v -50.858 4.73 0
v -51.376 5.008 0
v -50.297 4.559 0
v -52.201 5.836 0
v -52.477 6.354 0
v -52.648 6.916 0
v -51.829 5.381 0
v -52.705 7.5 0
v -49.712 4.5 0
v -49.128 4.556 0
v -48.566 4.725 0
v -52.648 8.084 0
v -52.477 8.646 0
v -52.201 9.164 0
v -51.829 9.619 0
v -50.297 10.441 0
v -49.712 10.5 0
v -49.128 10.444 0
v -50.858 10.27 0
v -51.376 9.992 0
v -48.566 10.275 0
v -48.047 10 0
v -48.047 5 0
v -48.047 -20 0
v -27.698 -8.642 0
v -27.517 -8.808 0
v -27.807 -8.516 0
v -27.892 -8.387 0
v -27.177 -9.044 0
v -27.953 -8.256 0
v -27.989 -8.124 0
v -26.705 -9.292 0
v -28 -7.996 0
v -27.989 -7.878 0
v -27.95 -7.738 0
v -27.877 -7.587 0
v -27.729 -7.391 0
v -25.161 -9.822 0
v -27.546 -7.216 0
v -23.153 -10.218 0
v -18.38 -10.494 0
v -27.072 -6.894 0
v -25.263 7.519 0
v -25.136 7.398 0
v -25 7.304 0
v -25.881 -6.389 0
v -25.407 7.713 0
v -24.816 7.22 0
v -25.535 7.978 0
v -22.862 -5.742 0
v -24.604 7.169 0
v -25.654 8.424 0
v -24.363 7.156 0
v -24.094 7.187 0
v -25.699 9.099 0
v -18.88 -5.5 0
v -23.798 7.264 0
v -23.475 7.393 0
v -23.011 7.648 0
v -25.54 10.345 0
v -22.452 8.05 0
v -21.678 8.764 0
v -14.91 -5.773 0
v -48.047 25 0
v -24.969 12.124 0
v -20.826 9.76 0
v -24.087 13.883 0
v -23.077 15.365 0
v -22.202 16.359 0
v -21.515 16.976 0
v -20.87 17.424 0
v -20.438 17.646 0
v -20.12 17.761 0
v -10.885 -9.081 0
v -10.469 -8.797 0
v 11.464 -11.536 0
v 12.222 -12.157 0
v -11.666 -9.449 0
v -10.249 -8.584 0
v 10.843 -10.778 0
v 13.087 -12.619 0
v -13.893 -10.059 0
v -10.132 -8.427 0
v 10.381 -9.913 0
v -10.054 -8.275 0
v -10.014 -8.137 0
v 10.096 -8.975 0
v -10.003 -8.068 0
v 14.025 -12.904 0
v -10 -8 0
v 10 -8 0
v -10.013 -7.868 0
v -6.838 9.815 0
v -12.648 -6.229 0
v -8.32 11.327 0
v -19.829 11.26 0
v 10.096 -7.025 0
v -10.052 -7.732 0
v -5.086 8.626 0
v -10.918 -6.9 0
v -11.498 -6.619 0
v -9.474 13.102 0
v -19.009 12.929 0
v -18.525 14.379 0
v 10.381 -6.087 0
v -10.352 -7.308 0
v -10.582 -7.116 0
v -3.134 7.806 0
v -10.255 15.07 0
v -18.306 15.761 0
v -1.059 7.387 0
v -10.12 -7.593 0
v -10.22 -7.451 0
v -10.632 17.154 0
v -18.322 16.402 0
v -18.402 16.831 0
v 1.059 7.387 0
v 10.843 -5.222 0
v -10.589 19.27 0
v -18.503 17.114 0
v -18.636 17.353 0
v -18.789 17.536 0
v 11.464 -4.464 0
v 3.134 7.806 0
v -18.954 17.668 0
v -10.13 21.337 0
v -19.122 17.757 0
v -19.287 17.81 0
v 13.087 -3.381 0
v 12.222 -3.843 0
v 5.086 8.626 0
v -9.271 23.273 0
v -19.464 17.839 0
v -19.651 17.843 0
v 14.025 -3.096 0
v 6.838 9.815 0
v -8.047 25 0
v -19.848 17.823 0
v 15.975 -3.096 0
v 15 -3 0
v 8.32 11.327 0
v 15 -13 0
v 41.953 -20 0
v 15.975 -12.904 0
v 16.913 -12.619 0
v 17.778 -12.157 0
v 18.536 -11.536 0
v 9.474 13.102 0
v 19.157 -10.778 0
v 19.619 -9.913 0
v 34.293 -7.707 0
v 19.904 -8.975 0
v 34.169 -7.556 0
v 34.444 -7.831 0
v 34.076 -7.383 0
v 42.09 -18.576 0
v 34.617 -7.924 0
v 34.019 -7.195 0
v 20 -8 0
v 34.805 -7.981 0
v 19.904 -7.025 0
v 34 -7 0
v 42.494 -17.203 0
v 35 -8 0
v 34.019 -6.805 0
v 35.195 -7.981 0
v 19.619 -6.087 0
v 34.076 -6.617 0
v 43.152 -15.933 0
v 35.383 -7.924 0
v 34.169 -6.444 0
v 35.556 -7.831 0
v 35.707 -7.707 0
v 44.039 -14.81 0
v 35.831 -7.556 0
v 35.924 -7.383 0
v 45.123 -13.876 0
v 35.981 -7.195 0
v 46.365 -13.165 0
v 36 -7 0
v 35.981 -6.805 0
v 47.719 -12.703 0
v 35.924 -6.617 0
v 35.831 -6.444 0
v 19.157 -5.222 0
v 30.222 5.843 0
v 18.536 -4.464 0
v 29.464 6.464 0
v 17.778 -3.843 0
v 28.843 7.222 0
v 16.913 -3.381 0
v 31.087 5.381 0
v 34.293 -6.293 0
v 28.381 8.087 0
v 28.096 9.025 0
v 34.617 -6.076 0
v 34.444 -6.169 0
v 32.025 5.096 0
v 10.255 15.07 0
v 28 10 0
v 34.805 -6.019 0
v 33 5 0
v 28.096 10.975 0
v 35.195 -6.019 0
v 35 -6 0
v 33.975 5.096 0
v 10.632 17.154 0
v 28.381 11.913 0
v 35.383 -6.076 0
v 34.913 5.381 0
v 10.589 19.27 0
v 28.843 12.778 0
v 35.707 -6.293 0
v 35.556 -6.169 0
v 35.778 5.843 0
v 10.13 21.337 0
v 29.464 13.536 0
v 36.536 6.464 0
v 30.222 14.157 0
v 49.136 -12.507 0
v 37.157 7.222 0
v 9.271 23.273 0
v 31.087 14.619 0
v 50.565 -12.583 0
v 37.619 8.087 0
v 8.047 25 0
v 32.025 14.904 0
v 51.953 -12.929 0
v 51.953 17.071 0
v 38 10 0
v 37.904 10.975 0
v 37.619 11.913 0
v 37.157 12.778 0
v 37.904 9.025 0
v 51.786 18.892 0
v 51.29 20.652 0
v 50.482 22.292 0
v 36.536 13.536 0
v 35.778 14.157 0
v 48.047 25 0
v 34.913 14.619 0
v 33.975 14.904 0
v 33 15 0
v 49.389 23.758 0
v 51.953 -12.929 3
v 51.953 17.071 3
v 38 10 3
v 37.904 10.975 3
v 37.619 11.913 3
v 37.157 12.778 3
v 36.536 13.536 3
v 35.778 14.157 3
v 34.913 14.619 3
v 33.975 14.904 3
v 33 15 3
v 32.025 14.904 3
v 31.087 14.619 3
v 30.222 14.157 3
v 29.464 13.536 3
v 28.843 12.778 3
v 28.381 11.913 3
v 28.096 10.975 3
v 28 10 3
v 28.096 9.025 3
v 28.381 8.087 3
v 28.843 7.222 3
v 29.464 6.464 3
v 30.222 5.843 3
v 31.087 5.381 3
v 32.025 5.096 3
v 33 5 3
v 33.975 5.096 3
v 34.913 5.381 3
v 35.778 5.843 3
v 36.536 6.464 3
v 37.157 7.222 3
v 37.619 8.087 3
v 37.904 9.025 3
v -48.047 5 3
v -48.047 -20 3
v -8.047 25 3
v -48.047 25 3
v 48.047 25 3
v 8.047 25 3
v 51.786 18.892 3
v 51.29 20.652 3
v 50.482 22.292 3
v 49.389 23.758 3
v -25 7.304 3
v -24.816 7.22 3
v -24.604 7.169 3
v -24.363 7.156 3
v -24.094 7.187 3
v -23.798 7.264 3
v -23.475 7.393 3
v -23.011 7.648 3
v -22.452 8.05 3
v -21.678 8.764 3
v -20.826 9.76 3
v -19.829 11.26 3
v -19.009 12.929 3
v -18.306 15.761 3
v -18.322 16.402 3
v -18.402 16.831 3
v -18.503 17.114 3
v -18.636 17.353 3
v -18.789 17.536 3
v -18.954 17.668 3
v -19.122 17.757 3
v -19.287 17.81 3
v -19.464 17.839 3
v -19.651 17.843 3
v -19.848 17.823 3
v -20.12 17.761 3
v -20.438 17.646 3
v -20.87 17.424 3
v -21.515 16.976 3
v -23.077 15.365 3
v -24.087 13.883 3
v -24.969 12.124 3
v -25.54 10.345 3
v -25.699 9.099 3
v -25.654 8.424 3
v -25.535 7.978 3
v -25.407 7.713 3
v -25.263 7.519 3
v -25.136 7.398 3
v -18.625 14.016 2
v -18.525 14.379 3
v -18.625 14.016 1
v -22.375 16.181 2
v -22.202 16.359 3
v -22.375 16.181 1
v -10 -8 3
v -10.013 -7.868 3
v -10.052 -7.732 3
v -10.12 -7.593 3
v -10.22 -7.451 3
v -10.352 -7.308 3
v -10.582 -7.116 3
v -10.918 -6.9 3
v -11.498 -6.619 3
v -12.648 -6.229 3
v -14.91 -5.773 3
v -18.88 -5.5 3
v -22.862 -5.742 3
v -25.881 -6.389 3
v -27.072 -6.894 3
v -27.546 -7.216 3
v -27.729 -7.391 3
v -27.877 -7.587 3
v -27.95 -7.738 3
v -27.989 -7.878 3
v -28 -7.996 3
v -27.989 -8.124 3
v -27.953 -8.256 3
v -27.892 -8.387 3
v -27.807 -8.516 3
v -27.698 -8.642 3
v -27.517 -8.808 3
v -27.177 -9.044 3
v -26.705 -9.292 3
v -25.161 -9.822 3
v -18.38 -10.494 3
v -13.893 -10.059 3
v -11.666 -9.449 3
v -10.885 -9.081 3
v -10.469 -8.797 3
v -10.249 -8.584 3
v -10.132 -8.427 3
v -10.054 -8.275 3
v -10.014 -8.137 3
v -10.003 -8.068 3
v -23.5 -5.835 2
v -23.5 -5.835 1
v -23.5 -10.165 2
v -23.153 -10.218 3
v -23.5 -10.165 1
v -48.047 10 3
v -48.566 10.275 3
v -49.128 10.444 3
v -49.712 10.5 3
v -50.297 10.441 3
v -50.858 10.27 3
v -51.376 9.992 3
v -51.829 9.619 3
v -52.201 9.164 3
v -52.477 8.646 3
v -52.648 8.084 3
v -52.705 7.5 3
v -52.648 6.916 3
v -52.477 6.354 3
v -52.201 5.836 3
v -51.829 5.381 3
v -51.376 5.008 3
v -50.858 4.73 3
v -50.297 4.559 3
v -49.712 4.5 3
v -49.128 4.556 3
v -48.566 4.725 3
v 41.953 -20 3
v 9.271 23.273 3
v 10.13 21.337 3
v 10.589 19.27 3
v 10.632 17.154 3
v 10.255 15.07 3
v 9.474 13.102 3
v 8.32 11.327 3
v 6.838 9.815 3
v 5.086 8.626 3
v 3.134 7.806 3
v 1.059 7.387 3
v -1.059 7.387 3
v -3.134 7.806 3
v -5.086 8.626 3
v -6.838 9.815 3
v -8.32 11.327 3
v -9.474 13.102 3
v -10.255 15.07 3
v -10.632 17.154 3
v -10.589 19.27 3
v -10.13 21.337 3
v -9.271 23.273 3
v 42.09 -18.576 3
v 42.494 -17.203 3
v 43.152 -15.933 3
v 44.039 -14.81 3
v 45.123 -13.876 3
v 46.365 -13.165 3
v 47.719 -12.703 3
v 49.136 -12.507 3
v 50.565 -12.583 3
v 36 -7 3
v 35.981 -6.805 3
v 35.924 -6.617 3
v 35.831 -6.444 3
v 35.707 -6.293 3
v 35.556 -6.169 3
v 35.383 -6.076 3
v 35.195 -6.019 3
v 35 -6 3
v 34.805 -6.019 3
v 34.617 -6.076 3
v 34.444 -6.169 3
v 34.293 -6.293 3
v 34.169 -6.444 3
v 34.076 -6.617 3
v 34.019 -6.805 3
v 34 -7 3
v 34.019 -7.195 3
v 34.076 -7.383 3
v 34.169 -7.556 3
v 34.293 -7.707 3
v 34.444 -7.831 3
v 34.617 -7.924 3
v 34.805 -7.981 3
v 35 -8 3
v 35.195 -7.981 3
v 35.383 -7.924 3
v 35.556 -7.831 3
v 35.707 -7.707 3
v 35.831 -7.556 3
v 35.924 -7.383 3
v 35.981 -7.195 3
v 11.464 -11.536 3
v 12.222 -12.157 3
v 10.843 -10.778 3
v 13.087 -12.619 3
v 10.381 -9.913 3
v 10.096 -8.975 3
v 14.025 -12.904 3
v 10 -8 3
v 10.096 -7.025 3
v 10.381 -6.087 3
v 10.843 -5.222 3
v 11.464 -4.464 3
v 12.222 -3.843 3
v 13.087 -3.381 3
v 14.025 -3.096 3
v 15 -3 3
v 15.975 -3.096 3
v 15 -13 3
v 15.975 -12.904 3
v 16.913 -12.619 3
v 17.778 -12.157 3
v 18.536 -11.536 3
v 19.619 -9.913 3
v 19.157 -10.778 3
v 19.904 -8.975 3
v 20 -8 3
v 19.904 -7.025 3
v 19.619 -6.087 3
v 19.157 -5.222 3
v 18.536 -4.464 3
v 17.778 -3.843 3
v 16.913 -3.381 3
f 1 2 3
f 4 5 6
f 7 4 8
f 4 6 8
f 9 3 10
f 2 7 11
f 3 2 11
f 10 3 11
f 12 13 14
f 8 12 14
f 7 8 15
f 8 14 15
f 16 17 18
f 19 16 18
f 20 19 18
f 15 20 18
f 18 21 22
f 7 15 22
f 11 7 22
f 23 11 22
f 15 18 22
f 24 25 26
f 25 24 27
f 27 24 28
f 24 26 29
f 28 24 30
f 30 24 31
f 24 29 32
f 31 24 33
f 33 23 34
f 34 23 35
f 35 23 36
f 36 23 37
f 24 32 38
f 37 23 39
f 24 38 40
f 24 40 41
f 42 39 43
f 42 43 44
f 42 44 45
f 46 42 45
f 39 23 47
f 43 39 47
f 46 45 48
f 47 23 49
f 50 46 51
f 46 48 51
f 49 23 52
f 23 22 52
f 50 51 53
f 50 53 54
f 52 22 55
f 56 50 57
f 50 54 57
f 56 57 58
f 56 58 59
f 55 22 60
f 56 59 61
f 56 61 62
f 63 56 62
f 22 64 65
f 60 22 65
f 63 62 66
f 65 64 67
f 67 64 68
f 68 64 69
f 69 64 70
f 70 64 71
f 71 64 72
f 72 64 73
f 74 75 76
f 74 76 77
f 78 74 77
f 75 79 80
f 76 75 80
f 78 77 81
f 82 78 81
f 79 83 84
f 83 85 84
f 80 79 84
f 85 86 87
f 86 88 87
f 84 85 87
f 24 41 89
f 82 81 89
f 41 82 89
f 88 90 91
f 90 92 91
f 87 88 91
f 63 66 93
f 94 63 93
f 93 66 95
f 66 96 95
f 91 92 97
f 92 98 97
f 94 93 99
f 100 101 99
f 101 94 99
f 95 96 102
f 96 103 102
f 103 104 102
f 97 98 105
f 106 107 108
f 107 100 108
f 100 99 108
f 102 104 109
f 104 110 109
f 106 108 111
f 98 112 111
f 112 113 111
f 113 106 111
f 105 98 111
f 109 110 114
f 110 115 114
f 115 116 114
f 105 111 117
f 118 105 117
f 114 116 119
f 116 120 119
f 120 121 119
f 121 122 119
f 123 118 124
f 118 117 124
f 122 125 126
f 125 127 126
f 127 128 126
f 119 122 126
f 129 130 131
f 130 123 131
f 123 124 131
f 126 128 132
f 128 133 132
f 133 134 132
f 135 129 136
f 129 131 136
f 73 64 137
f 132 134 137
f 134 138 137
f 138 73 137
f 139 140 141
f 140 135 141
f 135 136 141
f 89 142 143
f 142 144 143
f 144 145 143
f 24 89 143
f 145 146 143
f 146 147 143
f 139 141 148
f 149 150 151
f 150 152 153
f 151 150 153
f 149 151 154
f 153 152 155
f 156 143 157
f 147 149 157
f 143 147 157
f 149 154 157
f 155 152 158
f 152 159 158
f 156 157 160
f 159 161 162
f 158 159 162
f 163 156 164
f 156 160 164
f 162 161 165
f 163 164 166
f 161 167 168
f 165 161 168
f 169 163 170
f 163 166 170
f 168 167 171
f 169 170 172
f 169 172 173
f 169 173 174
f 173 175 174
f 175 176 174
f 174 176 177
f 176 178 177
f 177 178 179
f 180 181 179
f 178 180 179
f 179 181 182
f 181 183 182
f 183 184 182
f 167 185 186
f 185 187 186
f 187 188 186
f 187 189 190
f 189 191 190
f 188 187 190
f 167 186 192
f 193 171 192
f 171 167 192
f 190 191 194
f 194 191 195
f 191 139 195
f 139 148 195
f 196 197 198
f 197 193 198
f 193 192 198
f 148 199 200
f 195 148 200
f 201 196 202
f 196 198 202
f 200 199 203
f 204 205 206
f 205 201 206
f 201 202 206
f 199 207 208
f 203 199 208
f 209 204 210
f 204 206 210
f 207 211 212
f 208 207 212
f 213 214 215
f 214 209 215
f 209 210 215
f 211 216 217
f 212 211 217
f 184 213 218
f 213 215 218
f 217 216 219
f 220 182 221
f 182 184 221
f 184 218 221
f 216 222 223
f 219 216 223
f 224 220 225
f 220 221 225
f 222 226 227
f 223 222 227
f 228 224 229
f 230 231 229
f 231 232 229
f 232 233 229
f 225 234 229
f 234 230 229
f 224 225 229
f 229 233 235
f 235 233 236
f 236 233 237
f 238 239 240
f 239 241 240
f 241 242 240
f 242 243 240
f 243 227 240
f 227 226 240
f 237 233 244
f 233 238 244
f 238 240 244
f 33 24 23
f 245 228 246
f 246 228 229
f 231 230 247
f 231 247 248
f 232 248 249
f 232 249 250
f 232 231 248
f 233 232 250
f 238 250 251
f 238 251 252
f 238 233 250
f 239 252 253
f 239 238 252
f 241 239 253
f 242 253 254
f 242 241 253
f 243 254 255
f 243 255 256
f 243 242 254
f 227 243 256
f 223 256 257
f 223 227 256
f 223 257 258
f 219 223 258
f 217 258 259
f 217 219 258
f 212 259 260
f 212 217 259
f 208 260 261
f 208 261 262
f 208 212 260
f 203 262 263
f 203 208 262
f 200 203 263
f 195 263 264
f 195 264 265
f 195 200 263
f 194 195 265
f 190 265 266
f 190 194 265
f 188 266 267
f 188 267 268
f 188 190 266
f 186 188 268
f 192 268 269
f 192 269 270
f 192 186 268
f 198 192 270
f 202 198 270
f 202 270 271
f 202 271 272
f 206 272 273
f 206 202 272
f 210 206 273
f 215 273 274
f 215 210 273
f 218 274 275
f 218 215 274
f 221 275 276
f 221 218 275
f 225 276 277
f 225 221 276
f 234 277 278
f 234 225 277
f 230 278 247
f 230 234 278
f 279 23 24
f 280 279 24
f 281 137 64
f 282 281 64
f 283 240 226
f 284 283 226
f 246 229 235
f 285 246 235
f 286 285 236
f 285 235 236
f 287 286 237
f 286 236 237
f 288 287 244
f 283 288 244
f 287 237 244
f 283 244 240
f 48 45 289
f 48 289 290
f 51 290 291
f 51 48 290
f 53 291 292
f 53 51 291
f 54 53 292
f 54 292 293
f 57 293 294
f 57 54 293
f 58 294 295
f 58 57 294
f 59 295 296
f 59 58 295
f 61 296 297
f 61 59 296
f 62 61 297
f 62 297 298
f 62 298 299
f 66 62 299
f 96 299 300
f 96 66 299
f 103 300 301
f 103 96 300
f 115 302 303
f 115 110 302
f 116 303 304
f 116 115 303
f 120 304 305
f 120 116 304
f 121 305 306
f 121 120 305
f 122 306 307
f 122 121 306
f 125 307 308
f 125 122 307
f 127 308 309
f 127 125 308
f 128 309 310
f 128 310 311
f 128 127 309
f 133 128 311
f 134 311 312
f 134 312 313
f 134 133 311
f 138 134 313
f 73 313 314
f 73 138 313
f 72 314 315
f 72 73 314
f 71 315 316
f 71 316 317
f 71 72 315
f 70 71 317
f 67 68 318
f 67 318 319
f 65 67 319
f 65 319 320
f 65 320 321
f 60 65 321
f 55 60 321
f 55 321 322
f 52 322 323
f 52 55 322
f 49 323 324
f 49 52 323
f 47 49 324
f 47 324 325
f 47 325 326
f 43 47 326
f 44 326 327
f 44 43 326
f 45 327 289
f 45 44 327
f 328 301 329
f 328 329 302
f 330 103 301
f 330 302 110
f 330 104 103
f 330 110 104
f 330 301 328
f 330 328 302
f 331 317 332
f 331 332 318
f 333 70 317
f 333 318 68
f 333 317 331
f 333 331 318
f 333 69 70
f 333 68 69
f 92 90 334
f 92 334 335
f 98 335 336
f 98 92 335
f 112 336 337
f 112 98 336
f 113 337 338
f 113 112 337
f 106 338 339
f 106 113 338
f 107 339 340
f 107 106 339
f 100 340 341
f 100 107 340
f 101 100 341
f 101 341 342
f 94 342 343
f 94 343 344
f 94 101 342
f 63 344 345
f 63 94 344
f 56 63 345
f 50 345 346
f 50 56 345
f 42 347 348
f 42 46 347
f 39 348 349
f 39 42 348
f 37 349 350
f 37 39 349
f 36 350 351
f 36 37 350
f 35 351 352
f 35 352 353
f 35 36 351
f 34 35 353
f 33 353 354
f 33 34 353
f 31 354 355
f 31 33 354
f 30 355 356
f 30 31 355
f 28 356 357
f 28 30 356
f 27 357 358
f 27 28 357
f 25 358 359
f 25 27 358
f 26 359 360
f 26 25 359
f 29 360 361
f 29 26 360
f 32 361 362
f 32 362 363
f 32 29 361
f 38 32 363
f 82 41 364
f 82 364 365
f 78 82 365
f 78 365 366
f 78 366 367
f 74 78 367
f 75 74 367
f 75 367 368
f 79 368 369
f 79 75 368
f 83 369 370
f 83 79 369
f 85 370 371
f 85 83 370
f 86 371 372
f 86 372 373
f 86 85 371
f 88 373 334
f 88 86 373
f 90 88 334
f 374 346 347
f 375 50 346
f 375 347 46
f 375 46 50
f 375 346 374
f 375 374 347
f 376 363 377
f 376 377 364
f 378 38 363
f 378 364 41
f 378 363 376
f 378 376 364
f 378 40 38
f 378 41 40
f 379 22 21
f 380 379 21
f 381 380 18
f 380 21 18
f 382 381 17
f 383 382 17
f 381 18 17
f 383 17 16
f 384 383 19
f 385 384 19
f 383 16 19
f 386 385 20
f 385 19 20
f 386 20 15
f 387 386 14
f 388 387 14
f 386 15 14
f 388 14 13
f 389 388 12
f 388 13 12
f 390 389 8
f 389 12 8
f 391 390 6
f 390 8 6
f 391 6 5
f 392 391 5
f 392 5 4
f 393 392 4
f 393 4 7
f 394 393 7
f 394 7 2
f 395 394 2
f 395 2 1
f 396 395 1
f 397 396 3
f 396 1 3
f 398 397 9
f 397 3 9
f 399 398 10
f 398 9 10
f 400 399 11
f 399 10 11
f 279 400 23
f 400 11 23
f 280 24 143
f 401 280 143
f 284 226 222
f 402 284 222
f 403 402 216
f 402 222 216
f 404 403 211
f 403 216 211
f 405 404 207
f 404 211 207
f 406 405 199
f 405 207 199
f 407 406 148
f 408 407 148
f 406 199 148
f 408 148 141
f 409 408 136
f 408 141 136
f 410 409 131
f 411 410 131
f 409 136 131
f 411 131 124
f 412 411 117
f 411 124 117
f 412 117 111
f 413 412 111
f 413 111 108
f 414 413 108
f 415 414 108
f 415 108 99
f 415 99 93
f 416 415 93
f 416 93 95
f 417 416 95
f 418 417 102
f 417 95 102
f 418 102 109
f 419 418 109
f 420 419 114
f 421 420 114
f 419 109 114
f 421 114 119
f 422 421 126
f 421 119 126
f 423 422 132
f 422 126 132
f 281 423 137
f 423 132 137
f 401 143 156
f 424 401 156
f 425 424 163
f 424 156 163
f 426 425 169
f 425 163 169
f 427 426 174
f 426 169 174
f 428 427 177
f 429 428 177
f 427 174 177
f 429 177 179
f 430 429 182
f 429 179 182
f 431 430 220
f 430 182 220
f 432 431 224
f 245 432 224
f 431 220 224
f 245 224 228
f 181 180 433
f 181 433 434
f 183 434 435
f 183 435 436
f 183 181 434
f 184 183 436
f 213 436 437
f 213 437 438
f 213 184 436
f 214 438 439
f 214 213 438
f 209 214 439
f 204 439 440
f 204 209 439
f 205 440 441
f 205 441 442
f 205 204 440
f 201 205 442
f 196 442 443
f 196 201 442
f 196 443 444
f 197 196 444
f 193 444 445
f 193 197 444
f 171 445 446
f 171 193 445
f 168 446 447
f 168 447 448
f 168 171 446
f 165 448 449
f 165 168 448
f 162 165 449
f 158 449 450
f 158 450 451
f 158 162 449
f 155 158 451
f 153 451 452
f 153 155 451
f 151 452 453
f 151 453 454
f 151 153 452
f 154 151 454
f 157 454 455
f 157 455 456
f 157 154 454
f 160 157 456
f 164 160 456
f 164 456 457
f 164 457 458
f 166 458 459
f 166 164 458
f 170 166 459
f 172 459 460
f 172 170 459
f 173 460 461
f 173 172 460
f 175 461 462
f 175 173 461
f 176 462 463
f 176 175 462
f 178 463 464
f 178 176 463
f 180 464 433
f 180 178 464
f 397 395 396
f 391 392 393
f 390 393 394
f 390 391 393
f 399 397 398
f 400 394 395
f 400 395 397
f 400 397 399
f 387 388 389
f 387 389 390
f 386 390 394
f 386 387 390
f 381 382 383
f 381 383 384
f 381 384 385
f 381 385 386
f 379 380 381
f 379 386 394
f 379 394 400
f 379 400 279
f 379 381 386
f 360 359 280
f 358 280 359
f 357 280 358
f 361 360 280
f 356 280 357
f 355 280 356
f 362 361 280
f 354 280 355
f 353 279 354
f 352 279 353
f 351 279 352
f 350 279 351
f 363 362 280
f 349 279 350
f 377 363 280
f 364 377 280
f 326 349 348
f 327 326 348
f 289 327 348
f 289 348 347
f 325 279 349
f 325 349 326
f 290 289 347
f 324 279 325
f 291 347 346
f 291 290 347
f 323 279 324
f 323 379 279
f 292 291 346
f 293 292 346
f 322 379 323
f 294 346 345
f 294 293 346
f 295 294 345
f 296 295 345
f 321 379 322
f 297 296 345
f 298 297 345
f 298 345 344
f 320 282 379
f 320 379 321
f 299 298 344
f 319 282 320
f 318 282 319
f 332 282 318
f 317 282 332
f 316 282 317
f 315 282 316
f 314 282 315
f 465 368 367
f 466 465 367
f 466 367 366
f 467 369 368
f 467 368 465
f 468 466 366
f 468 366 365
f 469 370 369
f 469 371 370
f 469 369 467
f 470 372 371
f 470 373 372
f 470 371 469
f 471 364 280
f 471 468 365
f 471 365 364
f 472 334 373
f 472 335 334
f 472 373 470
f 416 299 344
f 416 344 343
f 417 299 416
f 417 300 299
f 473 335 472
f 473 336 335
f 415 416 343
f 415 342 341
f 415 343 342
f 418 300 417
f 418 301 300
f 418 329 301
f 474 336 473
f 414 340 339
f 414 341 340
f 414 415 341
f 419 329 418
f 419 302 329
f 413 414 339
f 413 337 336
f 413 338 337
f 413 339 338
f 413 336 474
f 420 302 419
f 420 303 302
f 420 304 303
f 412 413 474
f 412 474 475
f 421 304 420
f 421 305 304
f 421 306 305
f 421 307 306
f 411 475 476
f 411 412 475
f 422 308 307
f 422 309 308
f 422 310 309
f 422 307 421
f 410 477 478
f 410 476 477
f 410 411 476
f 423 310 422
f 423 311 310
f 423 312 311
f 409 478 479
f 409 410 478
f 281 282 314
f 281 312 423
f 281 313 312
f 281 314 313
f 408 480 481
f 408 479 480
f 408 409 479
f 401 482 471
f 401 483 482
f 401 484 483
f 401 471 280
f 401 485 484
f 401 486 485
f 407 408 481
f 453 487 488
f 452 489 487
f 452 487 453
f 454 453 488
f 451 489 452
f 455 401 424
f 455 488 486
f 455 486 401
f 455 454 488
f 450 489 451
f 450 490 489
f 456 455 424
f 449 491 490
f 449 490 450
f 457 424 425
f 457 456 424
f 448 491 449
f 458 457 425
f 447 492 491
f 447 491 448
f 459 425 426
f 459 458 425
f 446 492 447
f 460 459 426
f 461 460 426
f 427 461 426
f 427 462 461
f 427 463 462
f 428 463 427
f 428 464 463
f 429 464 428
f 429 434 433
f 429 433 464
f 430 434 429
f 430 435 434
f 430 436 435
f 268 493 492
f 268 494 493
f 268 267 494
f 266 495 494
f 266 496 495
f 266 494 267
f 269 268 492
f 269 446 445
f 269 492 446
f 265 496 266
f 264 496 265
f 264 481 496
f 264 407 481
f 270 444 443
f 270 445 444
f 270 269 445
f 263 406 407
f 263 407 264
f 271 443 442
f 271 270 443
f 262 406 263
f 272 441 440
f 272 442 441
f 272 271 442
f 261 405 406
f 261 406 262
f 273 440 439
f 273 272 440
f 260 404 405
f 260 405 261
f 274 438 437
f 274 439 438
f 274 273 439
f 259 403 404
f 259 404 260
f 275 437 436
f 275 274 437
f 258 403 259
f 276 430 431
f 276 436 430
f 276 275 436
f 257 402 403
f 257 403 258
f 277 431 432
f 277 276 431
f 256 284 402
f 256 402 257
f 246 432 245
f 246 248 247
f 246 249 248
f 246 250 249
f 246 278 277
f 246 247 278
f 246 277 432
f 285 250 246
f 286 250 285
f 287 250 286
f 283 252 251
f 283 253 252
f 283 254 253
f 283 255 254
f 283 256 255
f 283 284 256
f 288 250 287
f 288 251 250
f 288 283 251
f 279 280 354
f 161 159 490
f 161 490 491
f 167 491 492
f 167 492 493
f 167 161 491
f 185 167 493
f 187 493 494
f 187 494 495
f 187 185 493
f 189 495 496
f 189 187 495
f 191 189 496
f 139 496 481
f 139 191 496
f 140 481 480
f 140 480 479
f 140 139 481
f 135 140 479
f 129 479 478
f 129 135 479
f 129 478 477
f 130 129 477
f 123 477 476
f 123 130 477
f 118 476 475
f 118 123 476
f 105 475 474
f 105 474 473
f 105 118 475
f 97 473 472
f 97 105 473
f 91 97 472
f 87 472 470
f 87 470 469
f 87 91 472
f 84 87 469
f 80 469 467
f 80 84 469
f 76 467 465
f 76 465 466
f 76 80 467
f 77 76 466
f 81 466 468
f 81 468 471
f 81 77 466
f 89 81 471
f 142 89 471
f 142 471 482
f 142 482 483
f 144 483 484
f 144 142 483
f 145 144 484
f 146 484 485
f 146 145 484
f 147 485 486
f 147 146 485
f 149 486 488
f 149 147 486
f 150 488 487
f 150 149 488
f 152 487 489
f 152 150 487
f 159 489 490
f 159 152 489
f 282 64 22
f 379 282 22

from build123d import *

# Parameters (mm, degrees)
SKETCH_R   = 5
SKETCH_R_2 = 1
PAD_DEPTH  = 3


with BuildPart() as part:
    # Sketch → Pad (new body)
    with BuildSketch(Plane.XY):
        with BuildLine():
            Line((-48.046803, -20), (41.953197, -20))
            ThreePointArc((41.953197, -20), (45.12307, -13.876276), (51.953197, -12.928932))
            Line((51.953197, -12.928932), (51.953197, 17.071068))
            ThreePointArc((51.953197, 17.071068), (50.923594, 21.490567), (48.046803, 25))
            Line((48.046803, 25), (8.046803, 25))
            ThreePointArc((8.046803, 25), (0, 7.334587), (-8.046803, 25))
            Line((-8.046803, 25), (-48.046803, 25))
            Line((-48.046803, 25), (-48.046803, 10))
            ThreePointArc((-48.046803, 10), (-52.705115, 7.5), (-48.046803, 5))
            Line((-48.046803, 5), (-48.046803, -20))
        make_face()
        with Locations((33, 10)):
            Circle(SKETCH_R, mode=Mode.SUBTRACT)
        with Locations((35, -7)):
            Circle(SKETCH_R_2, mode=Mode.SUBTRACT)
        with BuildLine():
            add(Edge.make_bspline(
                [(-10, -8), (-10, -3.669873), (-23.5, -5.834936), (-37, -8), (-23.5, -10.165064), (-10, -12.330127), (-10, -8)],
                knots=[0, 0, 0, 2.094395, 2.094395, 4.18879, 4.18879, 6.283185, 6.283185, 6.283185], degree=2, weights=[1, 0.5, 1, 0.5, 1, 0.5, 1]))
        make_face(mode=Mode.SUBTRACT)
        with BuildLine():
            add(Edge.make_bspline(
                [(-25, 7.303848), (-21.25, 5.138784), (-18.625, 14.015544), (-16, 22.892305), (-22.375, 16.180608), (-28.75, 9.468911), (-25, 7.303848)],
                knots=[0, 0, 0, 2.094395, 2.094395, 4.18879, 4.18879, 6.283185, 6.283185, 6.283185], degree=2, weights=[1, 0.5, 1, 0.5, 1, 0.5, 1]))
        make_face(mode=Mode.SUBTRACT)
        with Locations((15, -8)):
            Circle(SKETCH_R, mode=Mode.SUBTRACT)
    extrude(amount=PAD_DEPTH)


solid = part.part
